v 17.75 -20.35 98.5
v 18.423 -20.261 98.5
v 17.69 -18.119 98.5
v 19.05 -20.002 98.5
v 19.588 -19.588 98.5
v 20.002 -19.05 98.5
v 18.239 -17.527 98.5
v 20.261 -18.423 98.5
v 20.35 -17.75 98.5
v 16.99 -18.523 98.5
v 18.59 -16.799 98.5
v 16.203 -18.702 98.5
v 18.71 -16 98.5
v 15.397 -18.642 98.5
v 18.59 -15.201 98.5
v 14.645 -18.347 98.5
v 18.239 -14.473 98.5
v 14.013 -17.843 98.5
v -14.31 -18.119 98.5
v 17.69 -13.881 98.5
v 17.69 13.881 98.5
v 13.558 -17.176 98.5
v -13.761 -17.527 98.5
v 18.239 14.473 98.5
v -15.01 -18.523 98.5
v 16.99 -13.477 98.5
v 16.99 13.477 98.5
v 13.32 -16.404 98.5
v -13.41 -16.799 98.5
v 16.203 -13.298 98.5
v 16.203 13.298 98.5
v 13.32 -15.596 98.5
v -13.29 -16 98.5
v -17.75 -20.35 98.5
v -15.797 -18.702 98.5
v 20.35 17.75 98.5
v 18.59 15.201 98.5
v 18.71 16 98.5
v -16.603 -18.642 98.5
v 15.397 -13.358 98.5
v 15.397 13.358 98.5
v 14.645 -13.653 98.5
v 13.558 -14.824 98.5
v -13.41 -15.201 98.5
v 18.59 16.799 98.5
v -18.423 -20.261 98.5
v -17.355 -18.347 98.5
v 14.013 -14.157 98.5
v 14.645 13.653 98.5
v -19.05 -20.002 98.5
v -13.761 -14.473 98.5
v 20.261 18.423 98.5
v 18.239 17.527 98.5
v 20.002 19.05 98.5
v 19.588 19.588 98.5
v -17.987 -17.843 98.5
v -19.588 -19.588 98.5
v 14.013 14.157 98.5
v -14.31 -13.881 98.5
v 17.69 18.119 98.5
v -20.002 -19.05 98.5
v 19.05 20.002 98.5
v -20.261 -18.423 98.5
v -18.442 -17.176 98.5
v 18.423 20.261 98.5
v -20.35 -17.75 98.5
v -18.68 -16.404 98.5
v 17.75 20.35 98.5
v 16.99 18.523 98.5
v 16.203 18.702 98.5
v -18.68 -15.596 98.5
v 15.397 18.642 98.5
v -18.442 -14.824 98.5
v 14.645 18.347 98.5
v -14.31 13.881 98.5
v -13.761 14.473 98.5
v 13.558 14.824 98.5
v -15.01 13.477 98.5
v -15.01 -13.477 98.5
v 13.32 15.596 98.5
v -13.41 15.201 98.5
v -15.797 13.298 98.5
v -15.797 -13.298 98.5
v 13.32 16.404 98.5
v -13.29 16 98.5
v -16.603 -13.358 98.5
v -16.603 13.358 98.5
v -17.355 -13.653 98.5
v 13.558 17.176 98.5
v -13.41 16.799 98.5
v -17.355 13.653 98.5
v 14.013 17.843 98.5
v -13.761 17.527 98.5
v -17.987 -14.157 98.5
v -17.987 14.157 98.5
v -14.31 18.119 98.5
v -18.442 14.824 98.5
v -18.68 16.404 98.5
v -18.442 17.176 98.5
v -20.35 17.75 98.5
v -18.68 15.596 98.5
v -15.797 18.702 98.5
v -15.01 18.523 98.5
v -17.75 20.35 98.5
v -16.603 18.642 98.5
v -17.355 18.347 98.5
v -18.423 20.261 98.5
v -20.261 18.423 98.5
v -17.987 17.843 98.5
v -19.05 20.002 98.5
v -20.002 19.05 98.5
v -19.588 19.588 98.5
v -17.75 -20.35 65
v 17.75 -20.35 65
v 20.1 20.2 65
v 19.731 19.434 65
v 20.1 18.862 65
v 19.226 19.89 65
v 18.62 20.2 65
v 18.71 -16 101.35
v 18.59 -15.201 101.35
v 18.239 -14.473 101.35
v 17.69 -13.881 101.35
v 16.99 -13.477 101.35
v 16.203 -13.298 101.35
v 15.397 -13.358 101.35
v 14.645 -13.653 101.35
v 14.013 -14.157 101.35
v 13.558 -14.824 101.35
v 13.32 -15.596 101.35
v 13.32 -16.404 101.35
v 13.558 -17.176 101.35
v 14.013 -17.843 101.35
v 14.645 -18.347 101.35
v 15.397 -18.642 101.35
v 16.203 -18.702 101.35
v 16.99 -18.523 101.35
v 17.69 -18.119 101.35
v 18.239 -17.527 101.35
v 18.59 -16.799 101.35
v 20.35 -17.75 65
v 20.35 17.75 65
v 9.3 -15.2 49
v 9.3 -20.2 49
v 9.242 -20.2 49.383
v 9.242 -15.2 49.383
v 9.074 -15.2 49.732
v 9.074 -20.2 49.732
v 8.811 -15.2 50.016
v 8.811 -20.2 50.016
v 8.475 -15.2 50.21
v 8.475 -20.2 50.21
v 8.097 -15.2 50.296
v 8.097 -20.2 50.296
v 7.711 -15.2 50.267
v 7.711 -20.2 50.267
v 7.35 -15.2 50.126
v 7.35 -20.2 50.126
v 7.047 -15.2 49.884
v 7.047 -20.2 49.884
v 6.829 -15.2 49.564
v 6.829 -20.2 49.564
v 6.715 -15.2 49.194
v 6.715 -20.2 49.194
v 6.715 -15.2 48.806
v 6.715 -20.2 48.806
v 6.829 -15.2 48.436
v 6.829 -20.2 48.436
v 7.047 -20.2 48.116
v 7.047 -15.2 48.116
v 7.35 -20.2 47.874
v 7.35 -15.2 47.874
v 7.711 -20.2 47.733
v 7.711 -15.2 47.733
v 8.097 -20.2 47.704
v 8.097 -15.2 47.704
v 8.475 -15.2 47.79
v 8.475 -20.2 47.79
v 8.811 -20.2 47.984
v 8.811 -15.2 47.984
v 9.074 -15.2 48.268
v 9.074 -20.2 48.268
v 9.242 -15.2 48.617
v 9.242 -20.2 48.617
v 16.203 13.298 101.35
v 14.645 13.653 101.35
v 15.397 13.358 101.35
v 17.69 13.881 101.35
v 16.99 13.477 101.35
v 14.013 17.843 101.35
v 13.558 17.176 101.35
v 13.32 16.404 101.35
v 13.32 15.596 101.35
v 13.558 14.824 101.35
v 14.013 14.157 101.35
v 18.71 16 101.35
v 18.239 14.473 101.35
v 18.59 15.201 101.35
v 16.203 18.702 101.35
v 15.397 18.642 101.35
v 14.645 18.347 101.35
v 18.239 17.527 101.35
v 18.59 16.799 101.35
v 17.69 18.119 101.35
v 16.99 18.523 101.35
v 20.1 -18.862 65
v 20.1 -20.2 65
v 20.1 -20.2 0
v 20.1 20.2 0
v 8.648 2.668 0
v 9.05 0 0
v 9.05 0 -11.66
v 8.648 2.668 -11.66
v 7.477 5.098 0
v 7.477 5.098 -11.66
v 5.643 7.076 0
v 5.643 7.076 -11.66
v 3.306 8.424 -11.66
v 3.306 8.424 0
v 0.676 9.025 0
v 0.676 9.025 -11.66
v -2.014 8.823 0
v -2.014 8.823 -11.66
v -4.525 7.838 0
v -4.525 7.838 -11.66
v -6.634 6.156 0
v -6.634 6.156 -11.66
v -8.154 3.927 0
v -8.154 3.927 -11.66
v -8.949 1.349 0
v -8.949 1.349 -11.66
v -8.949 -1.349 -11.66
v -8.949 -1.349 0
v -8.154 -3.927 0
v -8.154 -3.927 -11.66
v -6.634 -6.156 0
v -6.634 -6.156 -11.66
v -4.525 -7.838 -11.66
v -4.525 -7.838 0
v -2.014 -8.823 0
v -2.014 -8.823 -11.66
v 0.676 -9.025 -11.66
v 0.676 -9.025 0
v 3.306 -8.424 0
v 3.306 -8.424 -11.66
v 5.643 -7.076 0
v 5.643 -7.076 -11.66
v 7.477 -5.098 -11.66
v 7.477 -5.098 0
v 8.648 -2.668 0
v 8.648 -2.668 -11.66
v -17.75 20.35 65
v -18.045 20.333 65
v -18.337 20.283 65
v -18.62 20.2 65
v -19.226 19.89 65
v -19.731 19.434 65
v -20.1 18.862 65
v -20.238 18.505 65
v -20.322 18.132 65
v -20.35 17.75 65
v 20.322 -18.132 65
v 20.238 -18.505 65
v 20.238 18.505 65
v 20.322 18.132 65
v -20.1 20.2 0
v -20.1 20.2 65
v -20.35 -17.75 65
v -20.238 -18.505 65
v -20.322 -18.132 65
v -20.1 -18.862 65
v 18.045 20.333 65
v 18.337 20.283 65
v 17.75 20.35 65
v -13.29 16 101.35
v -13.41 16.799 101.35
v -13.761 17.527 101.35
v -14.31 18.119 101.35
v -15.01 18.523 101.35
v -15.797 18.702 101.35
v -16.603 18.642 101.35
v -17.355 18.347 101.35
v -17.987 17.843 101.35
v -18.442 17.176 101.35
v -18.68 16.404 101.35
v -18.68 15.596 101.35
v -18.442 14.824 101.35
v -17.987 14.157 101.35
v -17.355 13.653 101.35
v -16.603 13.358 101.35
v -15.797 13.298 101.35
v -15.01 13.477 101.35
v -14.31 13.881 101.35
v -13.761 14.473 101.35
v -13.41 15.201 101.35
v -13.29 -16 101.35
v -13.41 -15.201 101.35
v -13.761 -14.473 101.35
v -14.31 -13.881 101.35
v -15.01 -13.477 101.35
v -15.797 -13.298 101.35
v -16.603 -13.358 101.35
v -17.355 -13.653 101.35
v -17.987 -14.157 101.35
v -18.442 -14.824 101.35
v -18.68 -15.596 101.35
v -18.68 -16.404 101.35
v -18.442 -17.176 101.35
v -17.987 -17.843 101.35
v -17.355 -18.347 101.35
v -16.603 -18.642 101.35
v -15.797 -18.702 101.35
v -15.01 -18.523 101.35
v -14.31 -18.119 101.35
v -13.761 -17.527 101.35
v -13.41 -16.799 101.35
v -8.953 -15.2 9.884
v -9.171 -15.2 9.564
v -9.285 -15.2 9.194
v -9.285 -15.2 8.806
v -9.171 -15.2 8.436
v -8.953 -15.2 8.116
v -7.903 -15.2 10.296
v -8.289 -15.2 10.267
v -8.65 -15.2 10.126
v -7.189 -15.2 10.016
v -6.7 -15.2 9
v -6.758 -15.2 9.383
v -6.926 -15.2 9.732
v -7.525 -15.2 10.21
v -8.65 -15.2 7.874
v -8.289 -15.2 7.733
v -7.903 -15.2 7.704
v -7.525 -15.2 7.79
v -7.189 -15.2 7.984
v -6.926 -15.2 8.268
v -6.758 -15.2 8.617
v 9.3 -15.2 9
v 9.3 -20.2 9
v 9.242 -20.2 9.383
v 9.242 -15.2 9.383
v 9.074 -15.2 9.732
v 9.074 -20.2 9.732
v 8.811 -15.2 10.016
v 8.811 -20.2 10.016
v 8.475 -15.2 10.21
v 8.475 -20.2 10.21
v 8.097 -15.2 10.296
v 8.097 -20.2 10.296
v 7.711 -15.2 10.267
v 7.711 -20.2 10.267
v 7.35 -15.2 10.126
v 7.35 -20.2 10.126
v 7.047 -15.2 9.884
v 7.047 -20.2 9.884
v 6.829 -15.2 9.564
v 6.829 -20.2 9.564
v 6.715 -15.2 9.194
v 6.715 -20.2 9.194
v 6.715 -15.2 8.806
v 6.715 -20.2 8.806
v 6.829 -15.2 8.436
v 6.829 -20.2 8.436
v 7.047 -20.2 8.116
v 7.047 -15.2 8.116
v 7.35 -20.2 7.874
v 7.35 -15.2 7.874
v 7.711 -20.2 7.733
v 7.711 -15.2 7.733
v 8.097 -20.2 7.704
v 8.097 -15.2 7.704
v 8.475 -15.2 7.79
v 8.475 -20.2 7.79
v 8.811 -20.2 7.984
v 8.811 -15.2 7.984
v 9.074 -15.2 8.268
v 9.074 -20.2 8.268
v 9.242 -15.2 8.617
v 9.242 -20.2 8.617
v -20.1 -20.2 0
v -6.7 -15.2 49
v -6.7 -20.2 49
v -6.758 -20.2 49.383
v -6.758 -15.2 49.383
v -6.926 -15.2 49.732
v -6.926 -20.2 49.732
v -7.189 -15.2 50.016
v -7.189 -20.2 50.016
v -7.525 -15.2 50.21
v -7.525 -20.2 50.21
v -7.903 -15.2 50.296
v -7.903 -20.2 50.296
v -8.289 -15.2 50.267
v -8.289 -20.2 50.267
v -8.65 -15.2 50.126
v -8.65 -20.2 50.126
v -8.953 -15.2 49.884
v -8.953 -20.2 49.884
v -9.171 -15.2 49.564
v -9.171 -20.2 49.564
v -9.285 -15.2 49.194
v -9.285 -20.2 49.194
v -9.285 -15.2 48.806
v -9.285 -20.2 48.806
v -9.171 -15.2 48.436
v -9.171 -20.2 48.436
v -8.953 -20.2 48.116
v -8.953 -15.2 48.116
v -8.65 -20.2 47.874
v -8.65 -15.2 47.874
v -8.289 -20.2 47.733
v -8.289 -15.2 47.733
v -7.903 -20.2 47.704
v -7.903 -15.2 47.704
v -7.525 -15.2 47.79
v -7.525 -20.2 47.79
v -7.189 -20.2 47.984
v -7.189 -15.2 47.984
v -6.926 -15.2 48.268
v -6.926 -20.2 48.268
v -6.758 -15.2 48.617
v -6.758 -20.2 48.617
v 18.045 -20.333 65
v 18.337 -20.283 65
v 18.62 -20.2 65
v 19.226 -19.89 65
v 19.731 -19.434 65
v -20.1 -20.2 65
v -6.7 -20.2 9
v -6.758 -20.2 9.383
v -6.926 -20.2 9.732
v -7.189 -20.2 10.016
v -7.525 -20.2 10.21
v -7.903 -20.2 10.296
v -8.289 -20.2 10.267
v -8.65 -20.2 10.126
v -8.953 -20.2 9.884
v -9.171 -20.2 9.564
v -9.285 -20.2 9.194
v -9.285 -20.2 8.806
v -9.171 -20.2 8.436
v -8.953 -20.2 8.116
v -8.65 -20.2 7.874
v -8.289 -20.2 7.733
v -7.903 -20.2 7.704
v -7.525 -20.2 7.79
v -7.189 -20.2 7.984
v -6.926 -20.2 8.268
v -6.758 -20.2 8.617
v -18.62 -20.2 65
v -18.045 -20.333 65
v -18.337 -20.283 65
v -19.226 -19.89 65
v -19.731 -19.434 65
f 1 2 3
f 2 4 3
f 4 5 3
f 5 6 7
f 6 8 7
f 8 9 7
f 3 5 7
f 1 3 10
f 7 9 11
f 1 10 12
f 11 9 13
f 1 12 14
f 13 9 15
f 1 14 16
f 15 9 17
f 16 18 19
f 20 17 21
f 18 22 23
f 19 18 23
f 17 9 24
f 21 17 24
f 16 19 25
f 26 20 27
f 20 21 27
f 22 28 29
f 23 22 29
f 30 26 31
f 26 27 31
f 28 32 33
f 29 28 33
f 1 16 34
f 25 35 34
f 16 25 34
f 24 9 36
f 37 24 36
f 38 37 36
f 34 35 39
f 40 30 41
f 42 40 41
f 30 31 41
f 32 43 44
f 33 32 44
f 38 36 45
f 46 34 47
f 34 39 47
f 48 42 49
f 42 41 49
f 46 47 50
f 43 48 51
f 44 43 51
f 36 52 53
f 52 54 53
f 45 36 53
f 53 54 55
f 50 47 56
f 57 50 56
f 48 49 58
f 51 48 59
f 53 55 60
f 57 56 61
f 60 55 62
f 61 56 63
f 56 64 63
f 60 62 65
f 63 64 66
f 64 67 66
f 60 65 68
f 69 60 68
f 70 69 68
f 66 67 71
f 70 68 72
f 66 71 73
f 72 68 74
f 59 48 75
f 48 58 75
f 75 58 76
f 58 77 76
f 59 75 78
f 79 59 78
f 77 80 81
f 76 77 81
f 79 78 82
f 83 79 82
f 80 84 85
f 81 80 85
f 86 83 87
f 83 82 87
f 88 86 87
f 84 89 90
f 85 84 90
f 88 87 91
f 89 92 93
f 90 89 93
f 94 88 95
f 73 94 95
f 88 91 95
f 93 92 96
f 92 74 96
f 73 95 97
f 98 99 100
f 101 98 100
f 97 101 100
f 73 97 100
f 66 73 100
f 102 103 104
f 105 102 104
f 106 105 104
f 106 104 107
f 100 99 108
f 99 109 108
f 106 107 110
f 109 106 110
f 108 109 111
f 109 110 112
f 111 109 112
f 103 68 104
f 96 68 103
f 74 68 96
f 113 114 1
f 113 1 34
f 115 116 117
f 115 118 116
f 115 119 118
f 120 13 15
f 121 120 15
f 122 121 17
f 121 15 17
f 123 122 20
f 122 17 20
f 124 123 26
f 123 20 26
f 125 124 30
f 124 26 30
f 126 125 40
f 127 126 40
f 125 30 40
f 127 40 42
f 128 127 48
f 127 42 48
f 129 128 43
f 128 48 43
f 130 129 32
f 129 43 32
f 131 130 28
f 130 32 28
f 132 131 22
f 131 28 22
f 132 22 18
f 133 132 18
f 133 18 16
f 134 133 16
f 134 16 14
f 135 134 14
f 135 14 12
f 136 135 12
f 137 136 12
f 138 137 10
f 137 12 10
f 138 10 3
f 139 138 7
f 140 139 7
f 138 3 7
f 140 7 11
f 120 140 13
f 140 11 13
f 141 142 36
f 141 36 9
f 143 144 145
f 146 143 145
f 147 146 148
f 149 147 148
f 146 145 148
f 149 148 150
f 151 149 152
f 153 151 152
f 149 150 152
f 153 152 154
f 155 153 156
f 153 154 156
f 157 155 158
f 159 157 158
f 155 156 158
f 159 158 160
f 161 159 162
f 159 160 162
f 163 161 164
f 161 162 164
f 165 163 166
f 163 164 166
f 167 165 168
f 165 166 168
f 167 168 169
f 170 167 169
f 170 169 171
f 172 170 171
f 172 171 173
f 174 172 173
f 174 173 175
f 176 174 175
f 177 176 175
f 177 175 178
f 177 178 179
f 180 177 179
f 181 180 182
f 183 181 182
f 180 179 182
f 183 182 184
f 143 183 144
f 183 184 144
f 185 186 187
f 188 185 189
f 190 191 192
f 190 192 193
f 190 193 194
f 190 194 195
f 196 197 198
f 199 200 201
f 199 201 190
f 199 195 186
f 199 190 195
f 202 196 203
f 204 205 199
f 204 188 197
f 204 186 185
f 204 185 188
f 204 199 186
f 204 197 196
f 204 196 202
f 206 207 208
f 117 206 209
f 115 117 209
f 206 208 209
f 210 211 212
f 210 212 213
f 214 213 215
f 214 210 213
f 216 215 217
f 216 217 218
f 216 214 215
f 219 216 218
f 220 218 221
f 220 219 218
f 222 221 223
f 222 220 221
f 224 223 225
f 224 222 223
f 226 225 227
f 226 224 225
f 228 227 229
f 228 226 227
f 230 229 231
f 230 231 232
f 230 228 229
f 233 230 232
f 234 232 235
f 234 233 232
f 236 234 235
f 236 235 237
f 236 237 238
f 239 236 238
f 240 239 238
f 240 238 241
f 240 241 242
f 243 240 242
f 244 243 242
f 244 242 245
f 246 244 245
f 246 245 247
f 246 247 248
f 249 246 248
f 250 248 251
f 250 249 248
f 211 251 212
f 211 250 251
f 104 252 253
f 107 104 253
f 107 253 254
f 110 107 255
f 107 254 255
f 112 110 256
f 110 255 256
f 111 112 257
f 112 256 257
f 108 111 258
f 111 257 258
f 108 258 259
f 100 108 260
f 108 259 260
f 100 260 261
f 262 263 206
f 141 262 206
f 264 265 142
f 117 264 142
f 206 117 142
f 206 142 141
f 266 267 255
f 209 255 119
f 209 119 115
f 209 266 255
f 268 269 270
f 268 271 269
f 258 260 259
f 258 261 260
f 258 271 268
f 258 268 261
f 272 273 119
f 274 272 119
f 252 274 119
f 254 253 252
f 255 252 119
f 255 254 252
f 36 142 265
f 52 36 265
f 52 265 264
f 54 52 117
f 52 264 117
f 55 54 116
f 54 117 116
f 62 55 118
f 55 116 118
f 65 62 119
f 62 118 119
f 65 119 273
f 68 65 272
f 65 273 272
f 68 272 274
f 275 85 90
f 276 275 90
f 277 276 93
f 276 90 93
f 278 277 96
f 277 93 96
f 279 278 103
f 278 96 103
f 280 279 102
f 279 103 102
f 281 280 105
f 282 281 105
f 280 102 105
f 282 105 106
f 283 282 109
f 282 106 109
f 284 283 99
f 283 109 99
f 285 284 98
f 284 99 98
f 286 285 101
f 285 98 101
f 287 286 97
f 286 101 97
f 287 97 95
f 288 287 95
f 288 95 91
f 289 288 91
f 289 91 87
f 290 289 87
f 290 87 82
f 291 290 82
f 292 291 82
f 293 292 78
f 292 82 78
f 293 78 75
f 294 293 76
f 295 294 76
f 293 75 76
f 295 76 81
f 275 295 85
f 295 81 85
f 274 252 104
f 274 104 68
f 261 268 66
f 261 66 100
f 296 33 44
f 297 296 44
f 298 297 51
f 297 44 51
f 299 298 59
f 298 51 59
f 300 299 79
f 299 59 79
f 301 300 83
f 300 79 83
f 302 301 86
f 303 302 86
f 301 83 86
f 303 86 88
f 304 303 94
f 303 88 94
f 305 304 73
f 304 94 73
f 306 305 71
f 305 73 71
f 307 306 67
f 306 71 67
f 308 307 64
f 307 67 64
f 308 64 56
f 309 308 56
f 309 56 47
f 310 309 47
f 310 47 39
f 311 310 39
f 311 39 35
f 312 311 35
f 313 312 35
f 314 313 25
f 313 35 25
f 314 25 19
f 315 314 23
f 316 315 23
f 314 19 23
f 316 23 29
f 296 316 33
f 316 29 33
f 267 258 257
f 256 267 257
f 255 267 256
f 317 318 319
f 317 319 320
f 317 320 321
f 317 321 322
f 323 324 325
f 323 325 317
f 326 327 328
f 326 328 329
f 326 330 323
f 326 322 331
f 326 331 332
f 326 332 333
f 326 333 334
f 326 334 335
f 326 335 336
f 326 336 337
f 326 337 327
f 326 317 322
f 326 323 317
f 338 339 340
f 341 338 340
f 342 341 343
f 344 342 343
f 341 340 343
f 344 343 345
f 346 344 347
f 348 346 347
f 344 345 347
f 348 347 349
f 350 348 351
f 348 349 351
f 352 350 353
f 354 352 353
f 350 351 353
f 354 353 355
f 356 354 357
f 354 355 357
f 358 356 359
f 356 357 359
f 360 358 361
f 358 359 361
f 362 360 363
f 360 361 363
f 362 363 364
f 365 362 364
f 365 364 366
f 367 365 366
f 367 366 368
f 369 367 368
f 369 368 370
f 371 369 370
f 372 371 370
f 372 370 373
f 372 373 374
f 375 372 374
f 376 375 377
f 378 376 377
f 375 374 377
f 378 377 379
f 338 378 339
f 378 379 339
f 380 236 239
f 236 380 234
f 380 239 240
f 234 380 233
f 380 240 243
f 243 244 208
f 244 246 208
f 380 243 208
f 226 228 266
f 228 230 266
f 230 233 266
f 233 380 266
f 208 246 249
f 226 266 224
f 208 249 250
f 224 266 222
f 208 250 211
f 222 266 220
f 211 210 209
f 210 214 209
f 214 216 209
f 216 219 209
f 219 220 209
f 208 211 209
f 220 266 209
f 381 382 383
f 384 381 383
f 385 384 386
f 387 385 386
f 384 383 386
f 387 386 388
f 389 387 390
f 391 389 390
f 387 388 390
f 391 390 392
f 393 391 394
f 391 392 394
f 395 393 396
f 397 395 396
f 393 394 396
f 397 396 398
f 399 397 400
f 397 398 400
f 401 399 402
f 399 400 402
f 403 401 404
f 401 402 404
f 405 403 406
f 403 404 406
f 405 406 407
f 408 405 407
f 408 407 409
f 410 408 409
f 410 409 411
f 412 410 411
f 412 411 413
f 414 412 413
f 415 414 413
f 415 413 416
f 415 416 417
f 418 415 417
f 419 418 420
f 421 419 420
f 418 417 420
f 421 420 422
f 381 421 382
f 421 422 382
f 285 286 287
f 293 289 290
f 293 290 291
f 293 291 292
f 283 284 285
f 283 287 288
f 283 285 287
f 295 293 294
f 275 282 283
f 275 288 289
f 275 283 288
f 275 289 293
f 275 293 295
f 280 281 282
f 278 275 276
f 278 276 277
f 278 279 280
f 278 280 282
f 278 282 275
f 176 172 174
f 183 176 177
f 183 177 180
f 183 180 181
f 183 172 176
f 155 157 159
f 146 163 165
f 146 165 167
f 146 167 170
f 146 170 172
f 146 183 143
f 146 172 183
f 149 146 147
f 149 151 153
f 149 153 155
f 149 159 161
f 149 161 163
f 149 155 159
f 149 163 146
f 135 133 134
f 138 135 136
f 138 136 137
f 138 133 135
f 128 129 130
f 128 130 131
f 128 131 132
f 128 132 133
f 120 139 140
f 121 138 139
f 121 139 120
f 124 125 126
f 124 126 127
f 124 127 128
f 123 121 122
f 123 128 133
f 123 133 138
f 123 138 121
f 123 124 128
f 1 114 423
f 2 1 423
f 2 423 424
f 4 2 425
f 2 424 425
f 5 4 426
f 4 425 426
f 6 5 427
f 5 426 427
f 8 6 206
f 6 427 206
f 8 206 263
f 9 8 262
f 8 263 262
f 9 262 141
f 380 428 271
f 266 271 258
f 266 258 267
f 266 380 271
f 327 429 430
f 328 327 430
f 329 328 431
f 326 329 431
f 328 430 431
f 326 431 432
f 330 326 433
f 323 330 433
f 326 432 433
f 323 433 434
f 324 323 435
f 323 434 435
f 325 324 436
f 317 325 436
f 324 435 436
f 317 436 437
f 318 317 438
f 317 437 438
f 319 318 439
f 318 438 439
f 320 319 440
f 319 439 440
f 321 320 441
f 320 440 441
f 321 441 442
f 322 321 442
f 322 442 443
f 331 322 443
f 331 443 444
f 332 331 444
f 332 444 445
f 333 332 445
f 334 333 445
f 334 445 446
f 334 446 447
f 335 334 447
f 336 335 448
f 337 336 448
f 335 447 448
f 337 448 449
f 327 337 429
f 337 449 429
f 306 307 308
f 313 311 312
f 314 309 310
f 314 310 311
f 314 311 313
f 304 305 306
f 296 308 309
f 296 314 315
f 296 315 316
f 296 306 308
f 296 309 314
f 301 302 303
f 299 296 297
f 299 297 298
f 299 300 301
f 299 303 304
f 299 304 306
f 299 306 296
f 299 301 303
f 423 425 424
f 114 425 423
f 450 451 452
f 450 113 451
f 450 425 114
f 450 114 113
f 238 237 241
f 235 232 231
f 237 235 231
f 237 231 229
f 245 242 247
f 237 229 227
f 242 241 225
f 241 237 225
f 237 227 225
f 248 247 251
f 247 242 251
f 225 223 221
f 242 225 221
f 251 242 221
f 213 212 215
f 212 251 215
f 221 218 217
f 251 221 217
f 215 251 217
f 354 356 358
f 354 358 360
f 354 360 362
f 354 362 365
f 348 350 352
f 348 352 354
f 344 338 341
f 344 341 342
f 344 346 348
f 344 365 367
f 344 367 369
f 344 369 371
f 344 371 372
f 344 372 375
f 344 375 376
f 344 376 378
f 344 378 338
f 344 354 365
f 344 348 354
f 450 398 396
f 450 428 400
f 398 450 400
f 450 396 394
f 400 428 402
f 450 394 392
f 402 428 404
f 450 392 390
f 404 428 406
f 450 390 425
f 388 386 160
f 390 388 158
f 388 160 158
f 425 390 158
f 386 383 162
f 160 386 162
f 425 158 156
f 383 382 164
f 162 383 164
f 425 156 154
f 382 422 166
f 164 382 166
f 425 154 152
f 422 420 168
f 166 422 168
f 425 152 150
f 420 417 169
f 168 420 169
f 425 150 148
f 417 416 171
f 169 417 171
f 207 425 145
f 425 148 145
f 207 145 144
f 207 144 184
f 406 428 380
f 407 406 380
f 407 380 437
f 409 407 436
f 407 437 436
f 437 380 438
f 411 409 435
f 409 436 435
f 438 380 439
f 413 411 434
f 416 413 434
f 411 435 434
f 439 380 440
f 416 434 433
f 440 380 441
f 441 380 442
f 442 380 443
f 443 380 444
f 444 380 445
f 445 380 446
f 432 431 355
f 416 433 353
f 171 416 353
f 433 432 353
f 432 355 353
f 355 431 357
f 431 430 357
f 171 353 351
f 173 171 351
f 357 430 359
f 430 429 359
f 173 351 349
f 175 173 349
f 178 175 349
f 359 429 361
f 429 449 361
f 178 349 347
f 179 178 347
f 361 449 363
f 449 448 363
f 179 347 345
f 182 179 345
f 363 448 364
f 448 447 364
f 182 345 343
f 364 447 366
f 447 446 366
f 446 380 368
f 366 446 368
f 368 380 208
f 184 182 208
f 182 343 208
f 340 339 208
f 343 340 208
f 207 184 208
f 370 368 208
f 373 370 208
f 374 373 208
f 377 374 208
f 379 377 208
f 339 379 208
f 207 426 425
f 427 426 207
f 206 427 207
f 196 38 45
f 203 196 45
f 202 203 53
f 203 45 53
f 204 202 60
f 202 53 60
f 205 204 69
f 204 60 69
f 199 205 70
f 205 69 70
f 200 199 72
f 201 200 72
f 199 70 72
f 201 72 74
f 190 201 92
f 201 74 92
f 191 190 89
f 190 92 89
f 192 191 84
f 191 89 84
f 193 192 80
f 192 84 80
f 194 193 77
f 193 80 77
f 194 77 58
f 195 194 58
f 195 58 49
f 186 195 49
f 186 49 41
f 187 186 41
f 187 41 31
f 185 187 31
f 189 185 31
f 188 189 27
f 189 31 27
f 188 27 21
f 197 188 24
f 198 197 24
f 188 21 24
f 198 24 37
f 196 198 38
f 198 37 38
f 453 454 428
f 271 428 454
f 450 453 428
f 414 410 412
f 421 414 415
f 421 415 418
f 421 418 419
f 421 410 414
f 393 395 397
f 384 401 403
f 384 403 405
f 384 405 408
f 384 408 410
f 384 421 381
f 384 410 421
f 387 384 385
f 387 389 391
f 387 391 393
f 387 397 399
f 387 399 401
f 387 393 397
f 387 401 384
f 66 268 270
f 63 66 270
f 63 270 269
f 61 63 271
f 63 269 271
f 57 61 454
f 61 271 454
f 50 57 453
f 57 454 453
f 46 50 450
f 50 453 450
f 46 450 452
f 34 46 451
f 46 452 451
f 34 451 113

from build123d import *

# Parameters (mm, degrees)
SKETCH070_W     = 40.2
SKETCH070_H     = 40.4
PAD024_DEPTH    = 65
SKETCH071_R     = 1.3
POCKET037_DEPTH = 5
PAD025_DEPTH    = 33.5
SKETCH073_R     = 9.05
PAD026_DEPTH    = 11.66
SKETCH074_R     = 2.71
PAD027_DEPTH    = 2.85


with BuildPart() as part:
    # Sketch070 → Pad024 (new body)
    with BuildSketch(Plane.XY):
        Rectangle(SKETCH070_W, SKETCH070_H)
    extrude(amount=PAD024_DEPTH)

    # Sketch071 → Pocket037 (cut)
    with BuildSketch(Plane.XZ.offset(20.2)):
        with Locations((8, 9)):
            Circle(SKETCH071_R)
        with Locations((-8, 9)):
            Circle(SKETCH071_R)
        with Locations((-8, 49)):
            Circle(SKETCH071_R)
        with Locations((8, 49)):
            Circle(SKETCH071_R)
    extrude(amount=-POCKET037_DEPTH, mode=Mode.SUBTRACT)

    # Sketch072 → Pad025 (join)
    with BuildSketch(Plane.XY.offset(65)):
        with BuildLine():
            Line((-17.75, 20.35), (17.75, 20.35))
            ThreePointArc((20.35, 17.75), (19.588478, 19.588478), (17.75, 20.35))
            Line((20.35, 17.75), (20.35, -17.75))
            ThreePointArc((17.75, -20.35), (19.588478, -19.588478), (20.35, -17.75))
            Line((17.75, -20.35), (-17.75, -20.35))
            ThreePointArc((-20.35, -17.75), (-19.588478, -19.588478), (-17.75, -20.35))
            Line((-20.35, -17.75), (-20.35, 17.75))
            ThreePointArc((-17.75, 20.35), (-19.588478, 19.588478), (-20.35, 17.75))
        make_face()
    extrude(amount=PAD025_DEPTH)

    # Sketch073 → Pad026 (join)
    with BuildSketch(Plane.XY):
        Circle(SKETCH073_R)
    extrude(amount=-PAD026_DEPTH)

    # Sketch074 → Pad027 (join)
    with BuildSketch(Plane.XY.offset(98.5)):
        with Locations((-16, 16)):
            Circle(SKETCH074_R)
        with Locations((16, 16)):
            Circle(SKETCH074_R)
        with Locations((16, -16)):
            Circle(SKETCH074_R)
        with Locations((-16, -16)):
            Circle(SKETCH074_R)
    extrude(amount=PAD027_DEPTH)


solid = part.part
